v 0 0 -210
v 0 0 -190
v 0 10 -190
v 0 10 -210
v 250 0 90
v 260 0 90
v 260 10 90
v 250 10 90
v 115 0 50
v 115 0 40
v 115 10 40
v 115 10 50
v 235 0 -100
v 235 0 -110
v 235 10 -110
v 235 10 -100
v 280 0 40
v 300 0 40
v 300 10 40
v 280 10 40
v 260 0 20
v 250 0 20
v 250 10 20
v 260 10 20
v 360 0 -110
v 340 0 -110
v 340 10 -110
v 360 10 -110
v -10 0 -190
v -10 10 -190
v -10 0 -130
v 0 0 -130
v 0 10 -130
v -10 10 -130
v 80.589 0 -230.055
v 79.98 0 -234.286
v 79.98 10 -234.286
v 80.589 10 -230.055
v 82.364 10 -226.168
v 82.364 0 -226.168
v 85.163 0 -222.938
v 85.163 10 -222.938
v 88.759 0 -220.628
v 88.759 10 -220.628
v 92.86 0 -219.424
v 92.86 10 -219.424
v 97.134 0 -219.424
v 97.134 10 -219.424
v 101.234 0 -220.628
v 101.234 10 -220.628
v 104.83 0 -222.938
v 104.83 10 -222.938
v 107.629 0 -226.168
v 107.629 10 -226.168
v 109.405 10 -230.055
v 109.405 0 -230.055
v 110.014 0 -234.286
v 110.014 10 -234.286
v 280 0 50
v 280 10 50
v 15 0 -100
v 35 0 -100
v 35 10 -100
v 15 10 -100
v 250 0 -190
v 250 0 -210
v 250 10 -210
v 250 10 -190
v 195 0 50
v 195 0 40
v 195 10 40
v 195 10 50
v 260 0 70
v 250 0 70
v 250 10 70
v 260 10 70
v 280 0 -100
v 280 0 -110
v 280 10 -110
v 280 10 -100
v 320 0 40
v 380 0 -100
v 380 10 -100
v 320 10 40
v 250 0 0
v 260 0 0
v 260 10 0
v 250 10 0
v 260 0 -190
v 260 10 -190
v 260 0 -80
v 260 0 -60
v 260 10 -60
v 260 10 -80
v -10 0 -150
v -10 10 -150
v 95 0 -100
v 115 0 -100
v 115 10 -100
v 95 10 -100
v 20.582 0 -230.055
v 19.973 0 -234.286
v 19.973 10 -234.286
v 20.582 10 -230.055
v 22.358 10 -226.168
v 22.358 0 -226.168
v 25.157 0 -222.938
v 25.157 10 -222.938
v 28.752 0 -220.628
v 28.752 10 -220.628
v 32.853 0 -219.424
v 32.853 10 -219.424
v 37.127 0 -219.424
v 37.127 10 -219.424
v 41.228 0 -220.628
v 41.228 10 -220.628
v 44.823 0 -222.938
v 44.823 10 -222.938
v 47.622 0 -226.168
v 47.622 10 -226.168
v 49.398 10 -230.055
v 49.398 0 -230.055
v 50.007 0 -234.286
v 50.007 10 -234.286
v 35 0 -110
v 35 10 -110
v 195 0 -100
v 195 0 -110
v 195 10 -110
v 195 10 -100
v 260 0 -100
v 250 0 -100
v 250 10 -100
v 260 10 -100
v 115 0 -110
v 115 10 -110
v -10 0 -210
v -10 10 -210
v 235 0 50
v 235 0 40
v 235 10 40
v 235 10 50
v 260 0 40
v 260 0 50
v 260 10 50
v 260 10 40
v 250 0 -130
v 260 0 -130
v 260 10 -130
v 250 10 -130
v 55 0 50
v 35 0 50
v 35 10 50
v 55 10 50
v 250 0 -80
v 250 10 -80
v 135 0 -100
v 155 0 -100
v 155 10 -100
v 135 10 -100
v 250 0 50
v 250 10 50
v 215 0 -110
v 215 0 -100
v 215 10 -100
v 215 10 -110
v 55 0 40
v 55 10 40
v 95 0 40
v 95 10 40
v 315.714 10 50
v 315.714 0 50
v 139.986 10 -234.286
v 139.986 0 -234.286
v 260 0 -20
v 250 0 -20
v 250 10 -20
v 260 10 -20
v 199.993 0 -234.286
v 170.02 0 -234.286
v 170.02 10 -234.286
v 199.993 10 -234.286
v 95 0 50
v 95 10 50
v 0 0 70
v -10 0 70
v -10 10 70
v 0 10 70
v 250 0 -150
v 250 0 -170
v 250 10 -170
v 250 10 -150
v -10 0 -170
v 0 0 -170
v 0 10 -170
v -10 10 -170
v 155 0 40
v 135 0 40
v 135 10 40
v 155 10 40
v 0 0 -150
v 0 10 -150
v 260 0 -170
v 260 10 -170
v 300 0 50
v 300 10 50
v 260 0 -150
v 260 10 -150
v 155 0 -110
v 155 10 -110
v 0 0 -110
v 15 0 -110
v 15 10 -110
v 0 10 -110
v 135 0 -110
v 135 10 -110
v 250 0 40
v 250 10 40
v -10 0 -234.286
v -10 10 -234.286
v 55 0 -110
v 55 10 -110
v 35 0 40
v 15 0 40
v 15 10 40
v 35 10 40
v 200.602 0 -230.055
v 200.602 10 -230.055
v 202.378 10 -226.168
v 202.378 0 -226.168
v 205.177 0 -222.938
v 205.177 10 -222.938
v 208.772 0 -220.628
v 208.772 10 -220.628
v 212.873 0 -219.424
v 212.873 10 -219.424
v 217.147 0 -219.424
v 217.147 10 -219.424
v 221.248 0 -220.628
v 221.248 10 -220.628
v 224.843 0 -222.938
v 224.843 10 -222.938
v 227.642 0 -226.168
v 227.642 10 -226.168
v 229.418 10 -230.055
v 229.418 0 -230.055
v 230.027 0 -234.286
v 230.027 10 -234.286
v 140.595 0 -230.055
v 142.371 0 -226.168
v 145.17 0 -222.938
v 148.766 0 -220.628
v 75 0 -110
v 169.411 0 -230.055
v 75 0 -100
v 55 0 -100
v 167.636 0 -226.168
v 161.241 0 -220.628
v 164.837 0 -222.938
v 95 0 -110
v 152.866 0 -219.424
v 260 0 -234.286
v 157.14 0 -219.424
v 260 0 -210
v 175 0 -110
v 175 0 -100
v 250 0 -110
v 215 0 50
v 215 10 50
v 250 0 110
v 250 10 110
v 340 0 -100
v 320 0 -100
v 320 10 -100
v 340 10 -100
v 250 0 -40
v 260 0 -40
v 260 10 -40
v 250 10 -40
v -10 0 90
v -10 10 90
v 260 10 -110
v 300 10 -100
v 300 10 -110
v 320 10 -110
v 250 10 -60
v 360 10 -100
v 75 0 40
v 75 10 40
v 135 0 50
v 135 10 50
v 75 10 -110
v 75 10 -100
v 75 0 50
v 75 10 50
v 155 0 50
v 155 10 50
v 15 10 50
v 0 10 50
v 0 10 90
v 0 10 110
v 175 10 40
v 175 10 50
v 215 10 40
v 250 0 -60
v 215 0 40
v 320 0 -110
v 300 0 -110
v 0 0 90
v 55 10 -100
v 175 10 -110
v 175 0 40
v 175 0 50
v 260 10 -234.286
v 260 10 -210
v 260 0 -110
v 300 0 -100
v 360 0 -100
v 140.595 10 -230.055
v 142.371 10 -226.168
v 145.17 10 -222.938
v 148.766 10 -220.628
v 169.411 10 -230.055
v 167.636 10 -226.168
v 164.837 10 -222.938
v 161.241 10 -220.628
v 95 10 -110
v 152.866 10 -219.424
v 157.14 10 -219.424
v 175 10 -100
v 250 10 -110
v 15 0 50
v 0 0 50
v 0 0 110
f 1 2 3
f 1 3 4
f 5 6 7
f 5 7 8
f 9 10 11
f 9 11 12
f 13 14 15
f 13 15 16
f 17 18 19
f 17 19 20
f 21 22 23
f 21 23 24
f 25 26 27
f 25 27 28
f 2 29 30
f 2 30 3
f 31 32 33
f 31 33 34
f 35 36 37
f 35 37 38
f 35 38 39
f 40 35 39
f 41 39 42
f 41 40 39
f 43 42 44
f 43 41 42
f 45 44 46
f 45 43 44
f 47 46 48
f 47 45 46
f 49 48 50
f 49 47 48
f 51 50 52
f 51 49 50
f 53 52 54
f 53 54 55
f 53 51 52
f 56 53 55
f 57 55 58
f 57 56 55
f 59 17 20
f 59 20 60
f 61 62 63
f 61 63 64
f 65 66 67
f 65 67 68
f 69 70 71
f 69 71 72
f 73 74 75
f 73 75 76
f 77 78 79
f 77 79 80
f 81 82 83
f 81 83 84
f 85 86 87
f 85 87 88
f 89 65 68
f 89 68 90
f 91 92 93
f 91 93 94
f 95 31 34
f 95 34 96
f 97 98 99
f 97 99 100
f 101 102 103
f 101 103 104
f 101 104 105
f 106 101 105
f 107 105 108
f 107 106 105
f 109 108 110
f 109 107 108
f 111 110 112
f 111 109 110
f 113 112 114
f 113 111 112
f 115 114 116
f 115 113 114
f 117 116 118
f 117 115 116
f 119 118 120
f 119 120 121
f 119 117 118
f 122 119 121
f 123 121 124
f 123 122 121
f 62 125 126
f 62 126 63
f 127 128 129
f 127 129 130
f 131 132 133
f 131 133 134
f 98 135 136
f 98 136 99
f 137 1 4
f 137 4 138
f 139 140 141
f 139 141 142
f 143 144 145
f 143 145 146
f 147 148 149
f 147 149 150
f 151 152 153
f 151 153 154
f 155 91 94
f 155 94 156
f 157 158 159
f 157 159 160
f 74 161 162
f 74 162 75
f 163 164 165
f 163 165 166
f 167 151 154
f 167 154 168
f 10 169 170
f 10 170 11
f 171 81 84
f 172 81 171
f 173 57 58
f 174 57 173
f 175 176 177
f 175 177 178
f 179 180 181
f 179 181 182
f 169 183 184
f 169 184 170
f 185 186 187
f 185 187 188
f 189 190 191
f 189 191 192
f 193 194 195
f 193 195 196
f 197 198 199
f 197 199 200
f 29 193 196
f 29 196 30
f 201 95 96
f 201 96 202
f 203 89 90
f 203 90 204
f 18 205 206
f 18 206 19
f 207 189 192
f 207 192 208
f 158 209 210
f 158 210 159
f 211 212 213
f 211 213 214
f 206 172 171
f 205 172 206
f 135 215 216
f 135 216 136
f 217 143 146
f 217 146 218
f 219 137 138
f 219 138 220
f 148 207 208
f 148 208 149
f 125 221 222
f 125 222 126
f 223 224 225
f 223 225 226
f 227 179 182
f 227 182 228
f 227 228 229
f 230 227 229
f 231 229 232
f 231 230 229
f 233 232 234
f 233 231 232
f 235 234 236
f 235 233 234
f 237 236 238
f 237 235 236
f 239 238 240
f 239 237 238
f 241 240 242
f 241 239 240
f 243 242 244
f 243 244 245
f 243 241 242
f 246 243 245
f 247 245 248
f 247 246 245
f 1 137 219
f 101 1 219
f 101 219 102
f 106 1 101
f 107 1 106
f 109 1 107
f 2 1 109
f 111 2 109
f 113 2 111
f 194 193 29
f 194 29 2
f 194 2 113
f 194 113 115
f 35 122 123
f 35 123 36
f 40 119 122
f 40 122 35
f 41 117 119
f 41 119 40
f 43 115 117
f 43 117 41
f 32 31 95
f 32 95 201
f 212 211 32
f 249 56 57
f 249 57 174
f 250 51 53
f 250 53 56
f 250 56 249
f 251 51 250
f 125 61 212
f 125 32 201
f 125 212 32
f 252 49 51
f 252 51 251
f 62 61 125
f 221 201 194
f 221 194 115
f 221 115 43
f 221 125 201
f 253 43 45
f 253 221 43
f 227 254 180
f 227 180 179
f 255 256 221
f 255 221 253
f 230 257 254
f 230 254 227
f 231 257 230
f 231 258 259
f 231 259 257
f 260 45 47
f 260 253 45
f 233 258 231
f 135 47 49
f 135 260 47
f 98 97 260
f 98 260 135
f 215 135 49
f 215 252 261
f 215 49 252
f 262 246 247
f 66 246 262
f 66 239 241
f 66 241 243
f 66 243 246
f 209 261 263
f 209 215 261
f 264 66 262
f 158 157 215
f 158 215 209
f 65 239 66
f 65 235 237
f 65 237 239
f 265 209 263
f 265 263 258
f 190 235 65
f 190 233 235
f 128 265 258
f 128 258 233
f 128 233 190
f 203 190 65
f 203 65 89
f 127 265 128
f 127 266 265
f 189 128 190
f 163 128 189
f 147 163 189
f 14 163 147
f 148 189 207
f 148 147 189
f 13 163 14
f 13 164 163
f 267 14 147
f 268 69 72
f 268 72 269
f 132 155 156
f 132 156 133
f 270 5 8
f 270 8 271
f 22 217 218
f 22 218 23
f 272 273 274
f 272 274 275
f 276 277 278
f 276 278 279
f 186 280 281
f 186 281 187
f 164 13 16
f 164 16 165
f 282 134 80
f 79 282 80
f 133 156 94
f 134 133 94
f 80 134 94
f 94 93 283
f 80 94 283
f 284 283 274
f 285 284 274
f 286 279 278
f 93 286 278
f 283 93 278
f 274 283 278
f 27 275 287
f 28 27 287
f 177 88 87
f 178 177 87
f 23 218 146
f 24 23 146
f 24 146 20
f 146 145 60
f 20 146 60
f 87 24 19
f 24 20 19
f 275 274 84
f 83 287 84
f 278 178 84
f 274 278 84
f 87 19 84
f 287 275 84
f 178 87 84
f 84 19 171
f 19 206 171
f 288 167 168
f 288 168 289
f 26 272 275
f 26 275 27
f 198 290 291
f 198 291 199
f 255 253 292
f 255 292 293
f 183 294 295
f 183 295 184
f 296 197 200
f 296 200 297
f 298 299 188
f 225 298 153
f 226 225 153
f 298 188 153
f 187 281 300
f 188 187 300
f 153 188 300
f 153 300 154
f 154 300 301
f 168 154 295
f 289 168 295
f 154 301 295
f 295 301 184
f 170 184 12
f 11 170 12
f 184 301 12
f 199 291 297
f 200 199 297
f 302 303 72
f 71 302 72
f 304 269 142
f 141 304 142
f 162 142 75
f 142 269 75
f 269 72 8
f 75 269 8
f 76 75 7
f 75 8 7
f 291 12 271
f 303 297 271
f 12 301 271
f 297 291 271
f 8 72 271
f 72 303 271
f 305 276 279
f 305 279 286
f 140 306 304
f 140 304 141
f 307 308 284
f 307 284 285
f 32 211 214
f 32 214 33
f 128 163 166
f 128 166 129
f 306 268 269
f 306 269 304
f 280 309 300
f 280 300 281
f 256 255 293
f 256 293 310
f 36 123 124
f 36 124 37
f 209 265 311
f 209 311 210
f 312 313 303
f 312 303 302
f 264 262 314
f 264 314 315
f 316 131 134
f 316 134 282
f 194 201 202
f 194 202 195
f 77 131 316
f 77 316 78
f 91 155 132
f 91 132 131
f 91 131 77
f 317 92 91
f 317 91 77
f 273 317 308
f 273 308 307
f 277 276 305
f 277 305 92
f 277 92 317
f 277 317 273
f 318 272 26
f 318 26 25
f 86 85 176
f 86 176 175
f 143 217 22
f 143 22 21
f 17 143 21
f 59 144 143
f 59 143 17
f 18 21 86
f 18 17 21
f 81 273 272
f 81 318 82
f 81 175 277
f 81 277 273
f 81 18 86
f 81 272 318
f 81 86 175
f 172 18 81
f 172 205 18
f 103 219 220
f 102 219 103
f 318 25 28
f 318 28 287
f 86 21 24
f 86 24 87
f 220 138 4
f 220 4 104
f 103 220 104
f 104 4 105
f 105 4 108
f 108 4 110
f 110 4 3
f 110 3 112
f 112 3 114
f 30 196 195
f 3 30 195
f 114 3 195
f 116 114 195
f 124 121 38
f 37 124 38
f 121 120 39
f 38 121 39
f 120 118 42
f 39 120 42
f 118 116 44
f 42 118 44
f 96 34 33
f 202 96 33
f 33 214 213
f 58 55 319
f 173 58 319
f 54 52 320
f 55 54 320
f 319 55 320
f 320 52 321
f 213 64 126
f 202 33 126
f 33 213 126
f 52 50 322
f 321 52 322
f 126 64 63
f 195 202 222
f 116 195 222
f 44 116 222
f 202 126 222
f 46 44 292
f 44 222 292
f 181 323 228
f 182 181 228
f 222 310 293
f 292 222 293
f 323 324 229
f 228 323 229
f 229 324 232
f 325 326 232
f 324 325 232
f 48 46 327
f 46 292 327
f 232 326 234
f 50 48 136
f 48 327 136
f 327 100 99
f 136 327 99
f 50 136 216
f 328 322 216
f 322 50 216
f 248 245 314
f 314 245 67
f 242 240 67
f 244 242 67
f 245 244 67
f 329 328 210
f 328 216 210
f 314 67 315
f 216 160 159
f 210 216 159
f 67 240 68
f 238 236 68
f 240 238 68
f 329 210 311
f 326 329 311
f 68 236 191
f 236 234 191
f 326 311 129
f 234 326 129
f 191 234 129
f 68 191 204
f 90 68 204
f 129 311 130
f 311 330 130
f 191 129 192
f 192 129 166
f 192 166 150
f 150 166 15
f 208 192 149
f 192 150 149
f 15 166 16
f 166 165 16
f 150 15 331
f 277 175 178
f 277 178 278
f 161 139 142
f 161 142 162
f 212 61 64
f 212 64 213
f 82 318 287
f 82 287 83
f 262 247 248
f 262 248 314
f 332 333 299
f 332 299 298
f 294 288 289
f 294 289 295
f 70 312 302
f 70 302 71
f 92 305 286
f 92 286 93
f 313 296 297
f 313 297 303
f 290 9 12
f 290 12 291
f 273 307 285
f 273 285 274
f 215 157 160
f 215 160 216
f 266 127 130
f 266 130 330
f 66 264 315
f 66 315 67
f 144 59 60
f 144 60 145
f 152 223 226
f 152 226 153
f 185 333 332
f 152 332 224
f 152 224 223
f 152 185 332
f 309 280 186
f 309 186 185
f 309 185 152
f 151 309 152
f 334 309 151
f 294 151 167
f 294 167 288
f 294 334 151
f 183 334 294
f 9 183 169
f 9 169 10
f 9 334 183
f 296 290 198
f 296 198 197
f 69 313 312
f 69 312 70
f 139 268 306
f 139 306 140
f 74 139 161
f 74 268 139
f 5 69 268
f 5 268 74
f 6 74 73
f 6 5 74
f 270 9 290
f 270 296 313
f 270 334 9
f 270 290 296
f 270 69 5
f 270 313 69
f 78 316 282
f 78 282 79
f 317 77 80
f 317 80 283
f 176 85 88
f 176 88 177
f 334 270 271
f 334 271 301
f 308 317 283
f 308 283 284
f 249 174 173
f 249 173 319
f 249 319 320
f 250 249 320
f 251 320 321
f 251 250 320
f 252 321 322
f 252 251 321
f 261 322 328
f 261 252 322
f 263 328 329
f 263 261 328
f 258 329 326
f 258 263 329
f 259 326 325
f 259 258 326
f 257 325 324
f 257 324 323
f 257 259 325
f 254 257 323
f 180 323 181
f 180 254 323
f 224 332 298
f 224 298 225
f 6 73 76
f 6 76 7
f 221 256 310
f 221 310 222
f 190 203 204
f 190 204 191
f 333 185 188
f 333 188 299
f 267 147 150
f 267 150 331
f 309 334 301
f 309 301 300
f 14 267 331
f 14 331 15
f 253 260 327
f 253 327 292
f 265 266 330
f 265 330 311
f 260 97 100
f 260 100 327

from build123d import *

# Parameters (mm, degrees)
F1_DEPTH = 10


# Not quite as in the source:
# - a feature names something its author has since deleted; it is built from what else it names


with BuildPart() as f1:
    # F0 (on Front) → F1 (new body)
    with BuildSketch(Plane.XZ):
        with BuildLine():
            Line((135, -100), (135, -110))
            Line((135, -110), (115, -110))
            Line((115, -110), (115, -100))
            Line((115, -100), (95, -100))
            Line((95, -100), (95, -110))
            Line((95, -110), (75, -110))
            Line((75, -110), (75, -100))
            Line((75, -100), (55, -100))
            Line((55, -100), (55, -110))
            Line((55, -110), (35, -110))
            Line((35, -110), (35, -100))
            Line((35, -100), (15, -100))
            Line((15, -100), (15, -110))
            Line((15, -110), (0, -110))
            Line((0, -110), (0, -130))
            Line((0, -130), (-10, -130))
            Line((-10, -130), (-10, -150))
            Line((-10, -150), (0, -150))
            Line((0, -150), (0, -170))
            Line((0, -170), (-10, -170))
            Line((-10, -170), (-10, -190))
            Line((-10, -190), (0, -190))
            Line((0, -190), (0, -210))
            Line((0, -210), (-10, -210))
            Line((-10, -210), (-10, -234.2857142857))
            Line((-10, -234.2857142857), (19.9729451345, -234.2857142857))
            ThreePointArc((19.9729451345, -234.2857142857), (34.9898544254, -219.2712298368), (50.0067637164, -234.2857142857))
            Line((50.0067637164, -234.2857142857), (79.9797088509, -234.2857142857))
            ThreePointArc((79.9797088509, -234.2857142857), (94.9966181418, -219.2712298368), (110.0135274328, -234.2857142857))
            Line((110.0135274328, -234.2857142857), (139.9864725672, -234.2857142857))
            ThreePointArc((139.9864725672, -234.2857142857), (155.0033818582, -219.2712298368), (170.0202911491, -234.2857142857))
            Line((170.0202911491, -234.2857142857), (199.9932362836, -234.2857142857))
            ThreePointArc((199.9932362836, -234.2857142857), (215.0101455746, -219.2712298368), (230.0270548655, -234.2857142857))
            Line((230.0270548655, -234.2857142857), (260, -234.2857142857))
            Line((260, -234.2857142857), (260, -210))
            Line((260, -210), (250, -210))
            Line((250, -210), (250, -190))
            Line((250, -190), (260, -190))
            Line((260, -190), (260, -170))
            Line((260, -170), (250, -170))
            Line((250, -170), (250, -150))
            Line((250, -150), (260, -150))
            Line((260, -150), (260, -130))
            Line((260, -130), (250, -130))
            Line((250, -130), (250, -110))
            Line((250, -110), (235, -110))
            Line((235, -110), (235, -100))
            Line((235, -100), (215, -100))
            Line((215, -100), (215, -110))
            Line((215, -110), (195, -110))
            Line((195, -110), (195, -100))
            Line((195, -100), (175, -100))
            Line((175, -100), (175, -110))
            Line((175, -110), (155, -110))
            Line((155, -110), (155, -100))
            Line((155, -100), (135, -100))
        make_face()
    extrude(amount=-F1_DEPTH)


with BuildPart() as f1b:
    # F0 (on Front) → F1, piece 2 (new body)
    with BuildSketch(Plane.XZ):
        Polygon((260, -100), (260, -110), (280, -110), (280, -100), (300, -100), (300, -110), (320, -110), (320, -100), (340, -100), (340, -110), (360, -110), (360, -100), (380, -100), (320, 40), (315.7142857143, 50), (300, 50), (300, 40), (280, 40), (280, 50), (260, 50), (260, 40), (250, 40), (250, 20), (260, 20), (260, 0), (250, 0), (250, -20), (260, -20), (260, -40), (250, -40), (250, -60), (260, -60), (260, -80), (250, -80), (250, -100), align=None)
    extrude(amount=-F1_DEPTH)


with BuildPart() as f1c:
    # F0 (on Front) → F1, piece 3 (new body)
    with BuildSketch(Plane.XZ):
        Polygon((235, 50), (250, 50), (250, 70), (260, 70), (260, 90), (250, 90), (250, 110), (0, 110), (0, 90), (-10, 90), (-10, 70), (0, 70), (0, 50), (15, 50), (15, 40), (35, 40), (35, 50), (55, 50), (55, 40), (75, 40), (75, 50), (95, 50), (95, 40), (115, 40), (115, 50), (135, 50), (135, 40), (155, 40), (155, 50), (175, 50), (175, 40), (195, 40), (195, 50), (215, 50), (215, 40), (235, 40), align=None)
    extrude(amount=-F1_DEPTH)


solid = Compound([f1.part, f1b.part, f1c.part])
